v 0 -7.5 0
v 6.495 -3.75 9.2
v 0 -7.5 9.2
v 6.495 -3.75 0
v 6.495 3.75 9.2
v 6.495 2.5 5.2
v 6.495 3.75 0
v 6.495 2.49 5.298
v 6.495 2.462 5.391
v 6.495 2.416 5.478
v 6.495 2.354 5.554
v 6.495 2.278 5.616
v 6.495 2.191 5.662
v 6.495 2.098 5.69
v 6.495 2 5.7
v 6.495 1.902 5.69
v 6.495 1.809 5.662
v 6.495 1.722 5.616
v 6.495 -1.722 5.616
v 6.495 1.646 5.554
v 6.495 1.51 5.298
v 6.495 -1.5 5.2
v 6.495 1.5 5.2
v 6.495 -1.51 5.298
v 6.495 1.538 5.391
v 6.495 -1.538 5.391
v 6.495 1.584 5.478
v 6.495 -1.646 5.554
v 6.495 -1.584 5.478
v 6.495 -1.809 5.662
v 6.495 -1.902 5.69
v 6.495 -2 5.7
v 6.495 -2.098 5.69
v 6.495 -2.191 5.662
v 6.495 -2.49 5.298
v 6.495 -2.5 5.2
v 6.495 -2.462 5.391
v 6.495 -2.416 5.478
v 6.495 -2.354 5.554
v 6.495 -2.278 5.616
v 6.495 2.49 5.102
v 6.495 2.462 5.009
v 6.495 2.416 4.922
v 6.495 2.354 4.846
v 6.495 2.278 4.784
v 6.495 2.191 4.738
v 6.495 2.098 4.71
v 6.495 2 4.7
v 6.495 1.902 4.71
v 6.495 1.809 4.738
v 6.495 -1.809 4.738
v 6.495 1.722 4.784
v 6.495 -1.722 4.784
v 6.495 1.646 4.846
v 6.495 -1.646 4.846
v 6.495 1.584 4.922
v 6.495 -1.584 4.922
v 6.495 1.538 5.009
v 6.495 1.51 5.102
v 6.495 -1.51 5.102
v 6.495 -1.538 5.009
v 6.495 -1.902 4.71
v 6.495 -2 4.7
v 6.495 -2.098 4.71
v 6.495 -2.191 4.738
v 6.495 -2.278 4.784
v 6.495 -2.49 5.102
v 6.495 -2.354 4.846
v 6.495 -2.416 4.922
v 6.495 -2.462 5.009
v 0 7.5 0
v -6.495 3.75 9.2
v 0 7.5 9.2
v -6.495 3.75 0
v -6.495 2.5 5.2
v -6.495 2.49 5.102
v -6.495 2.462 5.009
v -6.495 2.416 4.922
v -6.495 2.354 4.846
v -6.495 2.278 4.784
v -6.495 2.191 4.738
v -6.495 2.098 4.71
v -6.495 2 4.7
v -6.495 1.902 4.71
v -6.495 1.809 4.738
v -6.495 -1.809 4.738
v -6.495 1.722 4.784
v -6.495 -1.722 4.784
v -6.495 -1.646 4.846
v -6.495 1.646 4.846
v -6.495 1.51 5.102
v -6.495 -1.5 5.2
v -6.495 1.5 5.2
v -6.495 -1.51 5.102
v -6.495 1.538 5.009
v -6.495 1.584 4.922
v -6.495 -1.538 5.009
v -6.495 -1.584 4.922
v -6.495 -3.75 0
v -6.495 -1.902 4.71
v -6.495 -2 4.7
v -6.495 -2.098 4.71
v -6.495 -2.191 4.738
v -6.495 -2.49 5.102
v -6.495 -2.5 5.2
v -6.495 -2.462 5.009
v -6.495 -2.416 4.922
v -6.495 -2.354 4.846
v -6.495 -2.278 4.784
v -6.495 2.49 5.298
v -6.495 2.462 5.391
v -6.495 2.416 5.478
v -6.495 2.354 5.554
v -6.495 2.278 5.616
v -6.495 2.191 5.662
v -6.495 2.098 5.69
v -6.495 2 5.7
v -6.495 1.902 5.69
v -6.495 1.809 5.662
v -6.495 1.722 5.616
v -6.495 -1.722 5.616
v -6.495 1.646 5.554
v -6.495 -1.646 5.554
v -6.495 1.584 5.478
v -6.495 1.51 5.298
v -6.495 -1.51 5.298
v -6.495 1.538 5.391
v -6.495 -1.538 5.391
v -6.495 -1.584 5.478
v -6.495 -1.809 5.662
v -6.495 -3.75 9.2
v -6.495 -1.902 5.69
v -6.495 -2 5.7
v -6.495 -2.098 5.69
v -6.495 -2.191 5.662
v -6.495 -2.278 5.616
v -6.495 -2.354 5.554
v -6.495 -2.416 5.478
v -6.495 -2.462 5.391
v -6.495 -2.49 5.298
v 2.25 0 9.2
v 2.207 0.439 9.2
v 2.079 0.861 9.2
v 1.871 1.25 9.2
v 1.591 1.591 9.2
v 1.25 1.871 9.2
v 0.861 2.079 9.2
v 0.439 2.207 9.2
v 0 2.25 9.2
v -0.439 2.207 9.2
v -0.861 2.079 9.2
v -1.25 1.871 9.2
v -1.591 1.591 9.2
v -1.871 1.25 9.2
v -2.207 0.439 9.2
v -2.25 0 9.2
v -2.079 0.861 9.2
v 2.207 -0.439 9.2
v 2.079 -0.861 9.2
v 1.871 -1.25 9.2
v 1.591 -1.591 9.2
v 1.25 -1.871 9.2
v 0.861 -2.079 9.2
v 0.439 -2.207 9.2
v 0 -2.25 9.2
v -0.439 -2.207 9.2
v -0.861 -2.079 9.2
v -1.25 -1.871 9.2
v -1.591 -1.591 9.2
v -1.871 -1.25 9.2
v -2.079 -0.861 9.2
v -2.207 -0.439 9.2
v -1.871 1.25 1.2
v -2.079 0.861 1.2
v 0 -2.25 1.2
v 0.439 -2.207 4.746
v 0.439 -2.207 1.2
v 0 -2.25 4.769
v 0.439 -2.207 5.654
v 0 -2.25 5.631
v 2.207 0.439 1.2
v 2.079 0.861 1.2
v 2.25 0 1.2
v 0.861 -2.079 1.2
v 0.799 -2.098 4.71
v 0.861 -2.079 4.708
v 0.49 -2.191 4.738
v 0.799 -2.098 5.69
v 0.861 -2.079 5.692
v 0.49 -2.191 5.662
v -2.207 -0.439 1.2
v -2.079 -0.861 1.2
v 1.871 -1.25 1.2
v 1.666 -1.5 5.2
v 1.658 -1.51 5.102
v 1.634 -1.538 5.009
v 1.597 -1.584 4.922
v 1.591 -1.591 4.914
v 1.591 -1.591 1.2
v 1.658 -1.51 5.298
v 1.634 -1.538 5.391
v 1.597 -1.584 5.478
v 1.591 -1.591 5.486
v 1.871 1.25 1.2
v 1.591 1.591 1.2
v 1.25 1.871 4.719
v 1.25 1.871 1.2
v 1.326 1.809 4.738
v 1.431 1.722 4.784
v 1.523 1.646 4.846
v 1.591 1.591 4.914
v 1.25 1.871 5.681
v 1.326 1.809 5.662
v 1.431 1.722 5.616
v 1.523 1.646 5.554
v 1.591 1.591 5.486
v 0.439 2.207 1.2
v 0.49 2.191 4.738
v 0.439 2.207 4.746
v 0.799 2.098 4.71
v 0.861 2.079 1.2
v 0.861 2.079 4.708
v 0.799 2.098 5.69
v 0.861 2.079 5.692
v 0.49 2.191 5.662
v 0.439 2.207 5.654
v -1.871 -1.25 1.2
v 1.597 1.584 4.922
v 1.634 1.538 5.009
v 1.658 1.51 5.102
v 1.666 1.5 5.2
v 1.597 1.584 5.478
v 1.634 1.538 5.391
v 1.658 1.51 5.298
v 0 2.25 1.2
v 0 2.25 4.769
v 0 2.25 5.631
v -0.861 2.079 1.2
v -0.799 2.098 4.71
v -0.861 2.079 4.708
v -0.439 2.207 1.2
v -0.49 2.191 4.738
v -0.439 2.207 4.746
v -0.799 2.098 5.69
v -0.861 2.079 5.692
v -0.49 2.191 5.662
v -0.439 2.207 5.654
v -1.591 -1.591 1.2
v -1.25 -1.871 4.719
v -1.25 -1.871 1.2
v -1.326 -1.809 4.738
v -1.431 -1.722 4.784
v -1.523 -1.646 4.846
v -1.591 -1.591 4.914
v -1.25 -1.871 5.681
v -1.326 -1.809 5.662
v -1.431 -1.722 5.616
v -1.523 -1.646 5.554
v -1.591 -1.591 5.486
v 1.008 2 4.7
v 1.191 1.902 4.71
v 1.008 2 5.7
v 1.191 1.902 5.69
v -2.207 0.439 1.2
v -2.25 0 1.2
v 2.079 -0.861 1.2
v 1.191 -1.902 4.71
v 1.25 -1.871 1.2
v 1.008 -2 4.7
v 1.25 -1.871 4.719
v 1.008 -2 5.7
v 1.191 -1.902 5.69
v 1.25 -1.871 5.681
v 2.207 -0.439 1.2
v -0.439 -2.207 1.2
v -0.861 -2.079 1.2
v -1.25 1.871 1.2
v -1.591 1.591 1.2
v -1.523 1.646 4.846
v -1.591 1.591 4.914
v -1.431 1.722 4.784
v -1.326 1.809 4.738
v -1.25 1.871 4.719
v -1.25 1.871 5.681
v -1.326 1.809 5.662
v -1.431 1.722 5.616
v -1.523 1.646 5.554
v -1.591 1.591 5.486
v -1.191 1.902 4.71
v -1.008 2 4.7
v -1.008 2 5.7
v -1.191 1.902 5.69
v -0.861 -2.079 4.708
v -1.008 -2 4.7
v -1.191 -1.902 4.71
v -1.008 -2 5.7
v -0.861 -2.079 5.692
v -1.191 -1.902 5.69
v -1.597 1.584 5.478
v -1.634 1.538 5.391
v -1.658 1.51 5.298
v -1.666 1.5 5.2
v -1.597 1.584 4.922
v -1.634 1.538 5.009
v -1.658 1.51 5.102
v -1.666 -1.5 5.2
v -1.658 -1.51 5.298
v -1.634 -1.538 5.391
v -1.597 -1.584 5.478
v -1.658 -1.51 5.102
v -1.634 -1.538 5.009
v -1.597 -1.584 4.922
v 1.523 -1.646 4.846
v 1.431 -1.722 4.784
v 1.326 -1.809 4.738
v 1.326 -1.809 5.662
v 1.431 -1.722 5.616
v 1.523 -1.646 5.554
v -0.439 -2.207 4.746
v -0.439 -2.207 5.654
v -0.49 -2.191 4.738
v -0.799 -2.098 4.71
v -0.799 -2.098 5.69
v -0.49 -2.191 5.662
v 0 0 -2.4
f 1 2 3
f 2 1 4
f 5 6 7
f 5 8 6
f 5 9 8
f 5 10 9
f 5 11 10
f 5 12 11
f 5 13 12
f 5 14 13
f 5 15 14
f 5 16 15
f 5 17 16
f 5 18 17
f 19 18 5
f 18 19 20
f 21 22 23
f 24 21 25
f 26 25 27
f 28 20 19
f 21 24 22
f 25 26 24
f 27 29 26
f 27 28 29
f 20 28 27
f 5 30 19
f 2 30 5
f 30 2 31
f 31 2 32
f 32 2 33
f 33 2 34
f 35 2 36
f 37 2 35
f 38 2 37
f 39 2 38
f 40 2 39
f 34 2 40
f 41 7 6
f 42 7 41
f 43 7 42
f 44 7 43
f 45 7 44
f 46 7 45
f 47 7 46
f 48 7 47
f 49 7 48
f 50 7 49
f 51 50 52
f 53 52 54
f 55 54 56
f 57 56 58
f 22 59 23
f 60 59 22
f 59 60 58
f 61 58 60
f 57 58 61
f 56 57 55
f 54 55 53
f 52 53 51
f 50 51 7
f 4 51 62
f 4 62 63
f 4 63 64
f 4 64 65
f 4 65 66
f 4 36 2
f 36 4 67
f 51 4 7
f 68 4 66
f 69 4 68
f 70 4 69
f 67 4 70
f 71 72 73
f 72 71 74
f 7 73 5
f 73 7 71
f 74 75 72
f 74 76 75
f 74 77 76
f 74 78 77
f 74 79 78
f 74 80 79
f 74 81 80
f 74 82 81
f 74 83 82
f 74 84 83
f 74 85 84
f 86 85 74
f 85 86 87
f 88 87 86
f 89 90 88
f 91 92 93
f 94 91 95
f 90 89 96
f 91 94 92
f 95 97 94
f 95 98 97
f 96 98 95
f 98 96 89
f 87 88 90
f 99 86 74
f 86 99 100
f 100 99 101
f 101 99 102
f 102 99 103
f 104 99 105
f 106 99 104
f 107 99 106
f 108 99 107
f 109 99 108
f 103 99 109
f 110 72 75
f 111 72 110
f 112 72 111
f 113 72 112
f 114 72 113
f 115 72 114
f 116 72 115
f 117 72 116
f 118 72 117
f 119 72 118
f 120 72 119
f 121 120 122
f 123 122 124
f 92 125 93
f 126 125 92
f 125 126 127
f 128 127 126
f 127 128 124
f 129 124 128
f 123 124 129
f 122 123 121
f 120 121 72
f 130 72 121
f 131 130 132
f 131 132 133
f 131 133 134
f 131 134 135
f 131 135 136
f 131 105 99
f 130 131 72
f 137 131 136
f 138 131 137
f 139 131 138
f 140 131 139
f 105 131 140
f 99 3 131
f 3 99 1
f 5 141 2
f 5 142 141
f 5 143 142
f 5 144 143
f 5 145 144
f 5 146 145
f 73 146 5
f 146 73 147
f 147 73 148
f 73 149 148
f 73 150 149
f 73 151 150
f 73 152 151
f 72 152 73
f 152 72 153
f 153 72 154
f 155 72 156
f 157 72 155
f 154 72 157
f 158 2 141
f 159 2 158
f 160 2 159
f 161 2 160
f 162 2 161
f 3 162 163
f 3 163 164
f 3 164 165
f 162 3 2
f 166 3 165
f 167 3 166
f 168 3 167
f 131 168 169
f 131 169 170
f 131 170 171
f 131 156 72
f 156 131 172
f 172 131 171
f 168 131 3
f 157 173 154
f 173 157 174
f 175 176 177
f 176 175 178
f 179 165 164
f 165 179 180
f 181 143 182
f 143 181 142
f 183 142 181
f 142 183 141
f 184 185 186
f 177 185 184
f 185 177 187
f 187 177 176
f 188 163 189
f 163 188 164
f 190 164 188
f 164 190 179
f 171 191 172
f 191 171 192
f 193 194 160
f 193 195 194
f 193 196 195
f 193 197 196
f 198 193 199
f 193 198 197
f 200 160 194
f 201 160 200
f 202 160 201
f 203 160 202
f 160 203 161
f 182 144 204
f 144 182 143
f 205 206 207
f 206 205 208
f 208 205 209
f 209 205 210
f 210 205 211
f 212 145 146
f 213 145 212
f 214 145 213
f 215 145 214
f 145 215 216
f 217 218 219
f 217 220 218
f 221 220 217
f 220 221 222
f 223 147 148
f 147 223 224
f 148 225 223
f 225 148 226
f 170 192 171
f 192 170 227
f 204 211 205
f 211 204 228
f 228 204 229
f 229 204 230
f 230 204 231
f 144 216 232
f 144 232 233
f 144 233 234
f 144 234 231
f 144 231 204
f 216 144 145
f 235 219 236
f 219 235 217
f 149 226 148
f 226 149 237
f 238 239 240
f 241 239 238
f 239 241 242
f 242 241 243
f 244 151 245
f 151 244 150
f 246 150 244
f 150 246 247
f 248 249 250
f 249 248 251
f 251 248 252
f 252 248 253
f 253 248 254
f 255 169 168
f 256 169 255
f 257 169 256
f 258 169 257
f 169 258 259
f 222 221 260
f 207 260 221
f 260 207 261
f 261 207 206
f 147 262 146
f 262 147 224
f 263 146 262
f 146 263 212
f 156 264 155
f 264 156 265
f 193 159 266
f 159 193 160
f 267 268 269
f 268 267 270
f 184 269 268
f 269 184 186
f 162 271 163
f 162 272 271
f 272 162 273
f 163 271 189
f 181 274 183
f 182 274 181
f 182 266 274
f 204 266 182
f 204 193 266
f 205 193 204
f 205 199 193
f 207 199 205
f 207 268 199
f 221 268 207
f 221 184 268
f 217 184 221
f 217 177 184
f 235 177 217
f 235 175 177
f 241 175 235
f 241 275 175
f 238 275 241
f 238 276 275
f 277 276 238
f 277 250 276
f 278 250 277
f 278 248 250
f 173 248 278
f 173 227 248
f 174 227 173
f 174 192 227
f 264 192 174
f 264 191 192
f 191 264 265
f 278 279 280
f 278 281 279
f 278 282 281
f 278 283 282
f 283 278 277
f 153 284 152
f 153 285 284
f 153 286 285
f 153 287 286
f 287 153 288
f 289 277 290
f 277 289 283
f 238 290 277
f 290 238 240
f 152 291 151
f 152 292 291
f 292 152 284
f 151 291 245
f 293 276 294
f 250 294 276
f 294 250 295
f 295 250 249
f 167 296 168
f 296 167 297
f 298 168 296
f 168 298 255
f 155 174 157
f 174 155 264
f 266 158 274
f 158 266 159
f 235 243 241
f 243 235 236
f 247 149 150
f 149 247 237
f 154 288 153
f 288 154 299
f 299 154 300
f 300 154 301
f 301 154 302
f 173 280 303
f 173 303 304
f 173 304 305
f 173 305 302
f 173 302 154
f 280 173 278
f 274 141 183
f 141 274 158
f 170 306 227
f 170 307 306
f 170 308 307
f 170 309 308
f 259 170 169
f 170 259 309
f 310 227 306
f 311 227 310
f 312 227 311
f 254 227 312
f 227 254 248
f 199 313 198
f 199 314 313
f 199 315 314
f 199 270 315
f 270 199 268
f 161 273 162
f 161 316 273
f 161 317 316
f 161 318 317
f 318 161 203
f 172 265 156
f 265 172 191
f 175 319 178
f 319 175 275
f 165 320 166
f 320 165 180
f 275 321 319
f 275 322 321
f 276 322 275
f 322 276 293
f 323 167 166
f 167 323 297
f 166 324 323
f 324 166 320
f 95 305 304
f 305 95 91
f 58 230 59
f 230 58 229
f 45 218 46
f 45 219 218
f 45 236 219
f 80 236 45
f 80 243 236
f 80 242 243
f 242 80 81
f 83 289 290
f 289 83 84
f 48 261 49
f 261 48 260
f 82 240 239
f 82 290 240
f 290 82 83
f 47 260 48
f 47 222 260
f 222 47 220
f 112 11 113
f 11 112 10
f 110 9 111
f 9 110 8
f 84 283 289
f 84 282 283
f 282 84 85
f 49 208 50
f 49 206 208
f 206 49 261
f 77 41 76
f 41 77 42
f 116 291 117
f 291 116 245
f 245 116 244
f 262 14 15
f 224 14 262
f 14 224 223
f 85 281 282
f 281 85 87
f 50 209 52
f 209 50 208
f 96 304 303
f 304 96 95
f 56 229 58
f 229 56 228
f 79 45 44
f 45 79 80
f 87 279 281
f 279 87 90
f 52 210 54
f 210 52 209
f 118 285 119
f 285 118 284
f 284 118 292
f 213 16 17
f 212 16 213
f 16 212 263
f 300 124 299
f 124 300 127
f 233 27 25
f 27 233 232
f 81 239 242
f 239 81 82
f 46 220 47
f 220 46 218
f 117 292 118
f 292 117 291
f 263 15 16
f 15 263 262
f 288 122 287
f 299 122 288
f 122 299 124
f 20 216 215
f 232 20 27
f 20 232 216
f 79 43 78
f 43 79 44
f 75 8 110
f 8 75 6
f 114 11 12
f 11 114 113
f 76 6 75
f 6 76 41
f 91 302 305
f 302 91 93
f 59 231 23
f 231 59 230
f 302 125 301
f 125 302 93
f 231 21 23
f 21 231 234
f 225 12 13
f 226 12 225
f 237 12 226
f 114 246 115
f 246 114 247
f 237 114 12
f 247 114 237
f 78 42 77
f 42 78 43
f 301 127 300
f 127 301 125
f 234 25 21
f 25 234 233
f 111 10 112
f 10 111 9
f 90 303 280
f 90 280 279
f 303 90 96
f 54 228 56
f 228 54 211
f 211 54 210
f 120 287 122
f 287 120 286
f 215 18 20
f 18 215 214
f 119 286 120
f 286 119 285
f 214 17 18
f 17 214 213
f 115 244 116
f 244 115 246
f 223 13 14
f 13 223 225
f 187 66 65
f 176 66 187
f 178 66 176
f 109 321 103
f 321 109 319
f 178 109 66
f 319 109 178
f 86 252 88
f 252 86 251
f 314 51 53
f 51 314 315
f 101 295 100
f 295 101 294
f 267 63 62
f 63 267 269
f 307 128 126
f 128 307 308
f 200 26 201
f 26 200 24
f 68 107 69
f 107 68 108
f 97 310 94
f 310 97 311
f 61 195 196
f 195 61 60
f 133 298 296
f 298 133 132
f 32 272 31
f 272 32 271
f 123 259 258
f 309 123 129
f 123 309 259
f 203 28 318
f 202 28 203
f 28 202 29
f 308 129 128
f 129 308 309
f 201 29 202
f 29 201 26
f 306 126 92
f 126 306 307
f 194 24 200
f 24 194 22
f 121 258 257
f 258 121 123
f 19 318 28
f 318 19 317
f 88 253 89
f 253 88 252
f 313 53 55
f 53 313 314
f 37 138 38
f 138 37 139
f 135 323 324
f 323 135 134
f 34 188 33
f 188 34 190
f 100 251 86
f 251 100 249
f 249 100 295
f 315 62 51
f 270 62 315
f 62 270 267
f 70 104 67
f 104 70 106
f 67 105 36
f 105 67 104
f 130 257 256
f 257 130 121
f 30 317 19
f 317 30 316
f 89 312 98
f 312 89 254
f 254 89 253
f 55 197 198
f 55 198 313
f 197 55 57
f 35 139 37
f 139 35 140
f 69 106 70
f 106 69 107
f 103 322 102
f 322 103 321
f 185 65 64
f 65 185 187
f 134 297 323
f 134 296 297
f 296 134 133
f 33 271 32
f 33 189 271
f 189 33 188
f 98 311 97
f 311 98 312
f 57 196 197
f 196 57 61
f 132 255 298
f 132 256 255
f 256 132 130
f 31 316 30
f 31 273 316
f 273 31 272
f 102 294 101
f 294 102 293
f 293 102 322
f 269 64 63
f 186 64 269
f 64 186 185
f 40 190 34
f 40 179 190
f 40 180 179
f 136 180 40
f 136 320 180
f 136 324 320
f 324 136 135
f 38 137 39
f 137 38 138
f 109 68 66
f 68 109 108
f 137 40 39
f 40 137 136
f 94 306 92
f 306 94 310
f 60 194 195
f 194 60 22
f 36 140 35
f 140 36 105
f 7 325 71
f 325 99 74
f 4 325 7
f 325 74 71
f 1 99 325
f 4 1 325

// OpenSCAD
$fn=32;
rodR=2;
innerR=rodR+0.25;

t=1.2;
h=8;


difference() {
  rotate([0,0,30]) cylinder(r=7.5,h=h+t, $fn=6);
  translate([0,0,t]) cylinder(r=innerR,h=h+0.1);
  translate([-50,rodR,4+t]) rotate([0,90,0]) cylinder(r=0.5,h=100);
  translate([-50,-rodR,4+t]) rotate([0,90,0]) cylinder(r=0.5,h=100);
}

 rotate([0,0,30]) translate([0,0,-t*2]) cylinder(r1=0, r2=7.5,h=t*2, $fn=6);

// cylinder(r=5.5,h=2);
